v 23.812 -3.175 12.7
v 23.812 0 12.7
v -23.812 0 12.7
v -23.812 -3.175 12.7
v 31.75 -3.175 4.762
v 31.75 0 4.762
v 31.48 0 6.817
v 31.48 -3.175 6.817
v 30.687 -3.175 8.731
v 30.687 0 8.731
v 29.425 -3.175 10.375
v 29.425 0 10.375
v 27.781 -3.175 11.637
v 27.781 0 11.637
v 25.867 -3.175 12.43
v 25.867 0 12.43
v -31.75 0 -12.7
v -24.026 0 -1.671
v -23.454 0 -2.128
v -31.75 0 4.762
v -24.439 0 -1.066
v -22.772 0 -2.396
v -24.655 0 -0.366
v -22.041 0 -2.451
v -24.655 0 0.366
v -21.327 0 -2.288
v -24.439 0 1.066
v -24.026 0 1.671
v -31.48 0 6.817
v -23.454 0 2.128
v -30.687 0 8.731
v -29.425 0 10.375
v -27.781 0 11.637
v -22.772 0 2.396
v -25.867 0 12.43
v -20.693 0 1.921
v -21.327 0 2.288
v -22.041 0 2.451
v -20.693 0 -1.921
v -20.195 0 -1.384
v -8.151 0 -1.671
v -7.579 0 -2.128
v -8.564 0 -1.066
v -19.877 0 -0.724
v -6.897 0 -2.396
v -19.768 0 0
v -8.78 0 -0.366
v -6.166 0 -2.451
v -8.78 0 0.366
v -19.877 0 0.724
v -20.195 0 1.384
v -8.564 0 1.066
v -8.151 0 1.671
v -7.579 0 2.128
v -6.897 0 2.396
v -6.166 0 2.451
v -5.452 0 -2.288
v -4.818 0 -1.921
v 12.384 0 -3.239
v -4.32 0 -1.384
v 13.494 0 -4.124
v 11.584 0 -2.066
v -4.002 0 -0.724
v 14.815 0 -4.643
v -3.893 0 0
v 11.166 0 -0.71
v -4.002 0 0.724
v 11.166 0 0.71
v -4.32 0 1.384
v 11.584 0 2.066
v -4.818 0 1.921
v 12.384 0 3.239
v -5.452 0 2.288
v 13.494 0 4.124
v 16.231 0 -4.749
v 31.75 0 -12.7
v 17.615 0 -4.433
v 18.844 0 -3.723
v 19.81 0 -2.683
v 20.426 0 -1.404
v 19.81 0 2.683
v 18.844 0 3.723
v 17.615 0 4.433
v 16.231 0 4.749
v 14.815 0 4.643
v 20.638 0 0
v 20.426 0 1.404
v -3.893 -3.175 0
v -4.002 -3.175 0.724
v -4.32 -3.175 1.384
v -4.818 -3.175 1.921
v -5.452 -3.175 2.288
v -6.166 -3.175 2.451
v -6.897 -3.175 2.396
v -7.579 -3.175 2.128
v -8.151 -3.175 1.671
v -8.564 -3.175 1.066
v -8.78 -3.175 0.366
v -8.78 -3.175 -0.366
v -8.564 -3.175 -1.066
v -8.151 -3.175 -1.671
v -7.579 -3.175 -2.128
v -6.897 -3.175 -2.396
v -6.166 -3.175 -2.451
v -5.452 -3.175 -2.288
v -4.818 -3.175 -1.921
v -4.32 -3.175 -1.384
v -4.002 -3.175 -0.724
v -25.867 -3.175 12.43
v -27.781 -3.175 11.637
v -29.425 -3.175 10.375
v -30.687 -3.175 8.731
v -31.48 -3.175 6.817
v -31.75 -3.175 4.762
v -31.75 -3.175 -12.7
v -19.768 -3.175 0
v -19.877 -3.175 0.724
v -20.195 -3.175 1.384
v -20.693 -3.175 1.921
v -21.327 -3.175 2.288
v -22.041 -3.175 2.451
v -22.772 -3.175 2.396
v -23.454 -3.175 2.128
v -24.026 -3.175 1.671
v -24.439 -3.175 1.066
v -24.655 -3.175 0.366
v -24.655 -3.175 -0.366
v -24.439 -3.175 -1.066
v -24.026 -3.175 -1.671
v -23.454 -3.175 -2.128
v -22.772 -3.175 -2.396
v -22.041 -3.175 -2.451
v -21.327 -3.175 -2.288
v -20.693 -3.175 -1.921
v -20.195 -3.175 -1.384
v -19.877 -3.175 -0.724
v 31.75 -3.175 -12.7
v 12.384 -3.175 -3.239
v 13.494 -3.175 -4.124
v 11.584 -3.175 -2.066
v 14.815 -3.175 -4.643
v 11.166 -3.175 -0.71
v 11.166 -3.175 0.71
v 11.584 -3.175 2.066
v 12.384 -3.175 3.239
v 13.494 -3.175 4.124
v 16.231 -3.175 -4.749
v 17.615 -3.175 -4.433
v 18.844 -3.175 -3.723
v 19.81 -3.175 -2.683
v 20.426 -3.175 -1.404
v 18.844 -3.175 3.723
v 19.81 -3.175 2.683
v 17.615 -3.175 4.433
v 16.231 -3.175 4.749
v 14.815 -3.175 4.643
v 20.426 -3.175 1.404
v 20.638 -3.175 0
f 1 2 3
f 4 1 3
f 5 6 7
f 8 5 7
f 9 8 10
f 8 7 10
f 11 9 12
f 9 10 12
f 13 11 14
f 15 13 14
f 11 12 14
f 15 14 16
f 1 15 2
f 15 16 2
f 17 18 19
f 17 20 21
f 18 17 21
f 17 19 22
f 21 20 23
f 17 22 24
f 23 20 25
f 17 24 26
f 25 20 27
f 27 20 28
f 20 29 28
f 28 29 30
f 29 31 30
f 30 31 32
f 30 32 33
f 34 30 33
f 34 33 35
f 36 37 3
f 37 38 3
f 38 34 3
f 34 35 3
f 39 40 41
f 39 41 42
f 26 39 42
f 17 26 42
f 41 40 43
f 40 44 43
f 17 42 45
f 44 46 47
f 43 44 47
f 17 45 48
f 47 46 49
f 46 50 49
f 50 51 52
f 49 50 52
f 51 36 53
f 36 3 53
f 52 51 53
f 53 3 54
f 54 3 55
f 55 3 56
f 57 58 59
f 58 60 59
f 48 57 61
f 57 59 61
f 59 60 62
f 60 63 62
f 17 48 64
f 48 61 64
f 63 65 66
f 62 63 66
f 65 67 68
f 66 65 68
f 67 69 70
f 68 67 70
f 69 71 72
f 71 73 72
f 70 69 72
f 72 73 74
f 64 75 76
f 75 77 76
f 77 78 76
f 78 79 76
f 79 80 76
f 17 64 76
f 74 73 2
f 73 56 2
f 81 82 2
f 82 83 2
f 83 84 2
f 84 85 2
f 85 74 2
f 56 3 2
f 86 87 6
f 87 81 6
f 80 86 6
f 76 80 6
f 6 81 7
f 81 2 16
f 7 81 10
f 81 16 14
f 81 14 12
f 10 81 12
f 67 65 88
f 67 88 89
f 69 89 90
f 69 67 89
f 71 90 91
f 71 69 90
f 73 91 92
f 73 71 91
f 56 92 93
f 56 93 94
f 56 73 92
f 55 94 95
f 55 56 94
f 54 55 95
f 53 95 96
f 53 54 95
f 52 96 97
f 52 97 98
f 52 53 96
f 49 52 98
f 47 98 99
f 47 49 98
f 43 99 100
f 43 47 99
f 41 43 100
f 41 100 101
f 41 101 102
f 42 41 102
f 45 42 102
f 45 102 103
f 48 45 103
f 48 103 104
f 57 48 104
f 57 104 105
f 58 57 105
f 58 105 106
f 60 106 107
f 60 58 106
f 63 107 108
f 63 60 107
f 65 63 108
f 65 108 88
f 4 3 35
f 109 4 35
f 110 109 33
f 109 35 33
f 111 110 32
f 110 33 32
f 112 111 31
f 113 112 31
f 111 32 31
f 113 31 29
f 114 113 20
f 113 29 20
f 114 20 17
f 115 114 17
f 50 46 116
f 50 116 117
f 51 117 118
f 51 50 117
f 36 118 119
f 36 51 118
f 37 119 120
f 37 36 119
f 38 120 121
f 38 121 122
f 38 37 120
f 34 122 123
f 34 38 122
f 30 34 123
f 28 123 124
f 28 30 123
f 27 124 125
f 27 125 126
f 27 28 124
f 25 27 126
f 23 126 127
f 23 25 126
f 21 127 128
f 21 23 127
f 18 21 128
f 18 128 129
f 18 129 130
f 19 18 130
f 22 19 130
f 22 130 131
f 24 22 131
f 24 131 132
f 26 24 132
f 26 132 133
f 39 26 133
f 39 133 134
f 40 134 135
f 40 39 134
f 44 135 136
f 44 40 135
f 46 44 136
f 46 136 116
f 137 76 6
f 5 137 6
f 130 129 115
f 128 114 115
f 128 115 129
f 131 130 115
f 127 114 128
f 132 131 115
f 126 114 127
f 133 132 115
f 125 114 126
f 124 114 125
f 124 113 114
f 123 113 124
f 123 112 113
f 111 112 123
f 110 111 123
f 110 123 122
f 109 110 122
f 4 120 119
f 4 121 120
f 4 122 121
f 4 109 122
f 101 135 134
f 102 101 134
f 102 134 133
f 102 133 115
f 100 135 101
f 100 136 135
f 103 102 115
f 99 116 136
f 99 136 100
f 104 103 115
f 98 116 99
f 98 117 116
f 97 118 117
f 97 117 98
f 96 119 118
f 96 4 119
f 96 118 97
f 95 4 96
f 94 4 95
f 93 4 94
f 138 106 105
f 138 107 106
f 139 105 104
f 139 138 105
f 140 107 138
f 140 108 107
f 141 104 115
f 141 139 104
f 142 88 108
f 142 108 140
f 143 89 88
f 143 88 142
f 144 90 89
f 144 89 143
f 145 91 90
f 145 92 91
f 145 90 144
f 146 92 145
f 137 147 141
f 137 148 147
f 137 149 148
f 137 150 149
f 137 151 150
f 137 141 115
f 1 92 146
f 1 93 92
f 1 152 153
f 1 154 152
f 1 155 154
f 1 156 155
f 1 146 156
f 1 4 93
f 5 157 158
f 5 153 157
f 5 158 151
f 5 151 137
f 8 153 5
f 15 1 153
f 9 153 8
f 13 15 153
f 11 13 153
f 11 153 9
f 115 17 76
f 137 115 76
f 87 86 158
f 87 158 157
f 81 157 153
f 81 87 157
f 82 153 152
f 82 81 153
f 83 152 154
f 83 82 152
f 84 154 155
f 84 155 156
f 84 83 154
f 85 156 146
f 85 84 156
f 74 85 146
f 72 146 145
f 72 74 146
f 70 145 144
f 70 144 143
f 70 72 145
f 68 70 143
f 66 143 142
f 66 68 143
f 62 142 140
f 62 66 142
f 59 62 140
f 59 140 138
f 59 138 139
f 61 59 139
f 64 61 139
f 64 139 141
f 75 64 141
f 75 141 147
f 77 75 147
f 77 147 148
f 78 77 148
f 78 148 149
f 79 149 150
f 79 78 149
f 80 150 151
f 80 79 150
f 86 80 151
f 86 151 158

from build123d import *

# Parameters (mm, degrees)
F0_R     = 2.45745
F0_R_2   = 4.7625
F1_DEPTH = 3.175


with BuildPart() as f1:
    # F0 (on Front) → F1 (new body)
    with BuildSketch(Plane.XZ):
        with BuildLine():
            Line((-31.75, -12.7), (31.75, -12.7))
            Line((31.75, -12.7), (31.75, 4.7625))
            ThreePointArc((31.75, 4.7625), (29.42516, 10.37516), (23.8125, 12.7))
            Line((23.8125, 12.7), (-23.8125, 12.7))
            ThreePointArc((-23.8125, 12.7), (-29.42516, 10.37516), (-31.75, 4.7625))
            Line((-31.75, 4.7625), (-31.75, -12.7))
        make_face()
        with Locations((-22.225, 0)):
            Circle(F0_R, mode=Mode.SUBTRACT)
        with Locations((-6.35, 0)):
            Circle(F0_R, mode=Mode.SUBTRACT)
        with Locations((15.875, 0)):
            Circle(F0_R_2, mode=Mode.SUBTRACT)
    extrude(amount=F1_DEPTH)


solid = f1.part
